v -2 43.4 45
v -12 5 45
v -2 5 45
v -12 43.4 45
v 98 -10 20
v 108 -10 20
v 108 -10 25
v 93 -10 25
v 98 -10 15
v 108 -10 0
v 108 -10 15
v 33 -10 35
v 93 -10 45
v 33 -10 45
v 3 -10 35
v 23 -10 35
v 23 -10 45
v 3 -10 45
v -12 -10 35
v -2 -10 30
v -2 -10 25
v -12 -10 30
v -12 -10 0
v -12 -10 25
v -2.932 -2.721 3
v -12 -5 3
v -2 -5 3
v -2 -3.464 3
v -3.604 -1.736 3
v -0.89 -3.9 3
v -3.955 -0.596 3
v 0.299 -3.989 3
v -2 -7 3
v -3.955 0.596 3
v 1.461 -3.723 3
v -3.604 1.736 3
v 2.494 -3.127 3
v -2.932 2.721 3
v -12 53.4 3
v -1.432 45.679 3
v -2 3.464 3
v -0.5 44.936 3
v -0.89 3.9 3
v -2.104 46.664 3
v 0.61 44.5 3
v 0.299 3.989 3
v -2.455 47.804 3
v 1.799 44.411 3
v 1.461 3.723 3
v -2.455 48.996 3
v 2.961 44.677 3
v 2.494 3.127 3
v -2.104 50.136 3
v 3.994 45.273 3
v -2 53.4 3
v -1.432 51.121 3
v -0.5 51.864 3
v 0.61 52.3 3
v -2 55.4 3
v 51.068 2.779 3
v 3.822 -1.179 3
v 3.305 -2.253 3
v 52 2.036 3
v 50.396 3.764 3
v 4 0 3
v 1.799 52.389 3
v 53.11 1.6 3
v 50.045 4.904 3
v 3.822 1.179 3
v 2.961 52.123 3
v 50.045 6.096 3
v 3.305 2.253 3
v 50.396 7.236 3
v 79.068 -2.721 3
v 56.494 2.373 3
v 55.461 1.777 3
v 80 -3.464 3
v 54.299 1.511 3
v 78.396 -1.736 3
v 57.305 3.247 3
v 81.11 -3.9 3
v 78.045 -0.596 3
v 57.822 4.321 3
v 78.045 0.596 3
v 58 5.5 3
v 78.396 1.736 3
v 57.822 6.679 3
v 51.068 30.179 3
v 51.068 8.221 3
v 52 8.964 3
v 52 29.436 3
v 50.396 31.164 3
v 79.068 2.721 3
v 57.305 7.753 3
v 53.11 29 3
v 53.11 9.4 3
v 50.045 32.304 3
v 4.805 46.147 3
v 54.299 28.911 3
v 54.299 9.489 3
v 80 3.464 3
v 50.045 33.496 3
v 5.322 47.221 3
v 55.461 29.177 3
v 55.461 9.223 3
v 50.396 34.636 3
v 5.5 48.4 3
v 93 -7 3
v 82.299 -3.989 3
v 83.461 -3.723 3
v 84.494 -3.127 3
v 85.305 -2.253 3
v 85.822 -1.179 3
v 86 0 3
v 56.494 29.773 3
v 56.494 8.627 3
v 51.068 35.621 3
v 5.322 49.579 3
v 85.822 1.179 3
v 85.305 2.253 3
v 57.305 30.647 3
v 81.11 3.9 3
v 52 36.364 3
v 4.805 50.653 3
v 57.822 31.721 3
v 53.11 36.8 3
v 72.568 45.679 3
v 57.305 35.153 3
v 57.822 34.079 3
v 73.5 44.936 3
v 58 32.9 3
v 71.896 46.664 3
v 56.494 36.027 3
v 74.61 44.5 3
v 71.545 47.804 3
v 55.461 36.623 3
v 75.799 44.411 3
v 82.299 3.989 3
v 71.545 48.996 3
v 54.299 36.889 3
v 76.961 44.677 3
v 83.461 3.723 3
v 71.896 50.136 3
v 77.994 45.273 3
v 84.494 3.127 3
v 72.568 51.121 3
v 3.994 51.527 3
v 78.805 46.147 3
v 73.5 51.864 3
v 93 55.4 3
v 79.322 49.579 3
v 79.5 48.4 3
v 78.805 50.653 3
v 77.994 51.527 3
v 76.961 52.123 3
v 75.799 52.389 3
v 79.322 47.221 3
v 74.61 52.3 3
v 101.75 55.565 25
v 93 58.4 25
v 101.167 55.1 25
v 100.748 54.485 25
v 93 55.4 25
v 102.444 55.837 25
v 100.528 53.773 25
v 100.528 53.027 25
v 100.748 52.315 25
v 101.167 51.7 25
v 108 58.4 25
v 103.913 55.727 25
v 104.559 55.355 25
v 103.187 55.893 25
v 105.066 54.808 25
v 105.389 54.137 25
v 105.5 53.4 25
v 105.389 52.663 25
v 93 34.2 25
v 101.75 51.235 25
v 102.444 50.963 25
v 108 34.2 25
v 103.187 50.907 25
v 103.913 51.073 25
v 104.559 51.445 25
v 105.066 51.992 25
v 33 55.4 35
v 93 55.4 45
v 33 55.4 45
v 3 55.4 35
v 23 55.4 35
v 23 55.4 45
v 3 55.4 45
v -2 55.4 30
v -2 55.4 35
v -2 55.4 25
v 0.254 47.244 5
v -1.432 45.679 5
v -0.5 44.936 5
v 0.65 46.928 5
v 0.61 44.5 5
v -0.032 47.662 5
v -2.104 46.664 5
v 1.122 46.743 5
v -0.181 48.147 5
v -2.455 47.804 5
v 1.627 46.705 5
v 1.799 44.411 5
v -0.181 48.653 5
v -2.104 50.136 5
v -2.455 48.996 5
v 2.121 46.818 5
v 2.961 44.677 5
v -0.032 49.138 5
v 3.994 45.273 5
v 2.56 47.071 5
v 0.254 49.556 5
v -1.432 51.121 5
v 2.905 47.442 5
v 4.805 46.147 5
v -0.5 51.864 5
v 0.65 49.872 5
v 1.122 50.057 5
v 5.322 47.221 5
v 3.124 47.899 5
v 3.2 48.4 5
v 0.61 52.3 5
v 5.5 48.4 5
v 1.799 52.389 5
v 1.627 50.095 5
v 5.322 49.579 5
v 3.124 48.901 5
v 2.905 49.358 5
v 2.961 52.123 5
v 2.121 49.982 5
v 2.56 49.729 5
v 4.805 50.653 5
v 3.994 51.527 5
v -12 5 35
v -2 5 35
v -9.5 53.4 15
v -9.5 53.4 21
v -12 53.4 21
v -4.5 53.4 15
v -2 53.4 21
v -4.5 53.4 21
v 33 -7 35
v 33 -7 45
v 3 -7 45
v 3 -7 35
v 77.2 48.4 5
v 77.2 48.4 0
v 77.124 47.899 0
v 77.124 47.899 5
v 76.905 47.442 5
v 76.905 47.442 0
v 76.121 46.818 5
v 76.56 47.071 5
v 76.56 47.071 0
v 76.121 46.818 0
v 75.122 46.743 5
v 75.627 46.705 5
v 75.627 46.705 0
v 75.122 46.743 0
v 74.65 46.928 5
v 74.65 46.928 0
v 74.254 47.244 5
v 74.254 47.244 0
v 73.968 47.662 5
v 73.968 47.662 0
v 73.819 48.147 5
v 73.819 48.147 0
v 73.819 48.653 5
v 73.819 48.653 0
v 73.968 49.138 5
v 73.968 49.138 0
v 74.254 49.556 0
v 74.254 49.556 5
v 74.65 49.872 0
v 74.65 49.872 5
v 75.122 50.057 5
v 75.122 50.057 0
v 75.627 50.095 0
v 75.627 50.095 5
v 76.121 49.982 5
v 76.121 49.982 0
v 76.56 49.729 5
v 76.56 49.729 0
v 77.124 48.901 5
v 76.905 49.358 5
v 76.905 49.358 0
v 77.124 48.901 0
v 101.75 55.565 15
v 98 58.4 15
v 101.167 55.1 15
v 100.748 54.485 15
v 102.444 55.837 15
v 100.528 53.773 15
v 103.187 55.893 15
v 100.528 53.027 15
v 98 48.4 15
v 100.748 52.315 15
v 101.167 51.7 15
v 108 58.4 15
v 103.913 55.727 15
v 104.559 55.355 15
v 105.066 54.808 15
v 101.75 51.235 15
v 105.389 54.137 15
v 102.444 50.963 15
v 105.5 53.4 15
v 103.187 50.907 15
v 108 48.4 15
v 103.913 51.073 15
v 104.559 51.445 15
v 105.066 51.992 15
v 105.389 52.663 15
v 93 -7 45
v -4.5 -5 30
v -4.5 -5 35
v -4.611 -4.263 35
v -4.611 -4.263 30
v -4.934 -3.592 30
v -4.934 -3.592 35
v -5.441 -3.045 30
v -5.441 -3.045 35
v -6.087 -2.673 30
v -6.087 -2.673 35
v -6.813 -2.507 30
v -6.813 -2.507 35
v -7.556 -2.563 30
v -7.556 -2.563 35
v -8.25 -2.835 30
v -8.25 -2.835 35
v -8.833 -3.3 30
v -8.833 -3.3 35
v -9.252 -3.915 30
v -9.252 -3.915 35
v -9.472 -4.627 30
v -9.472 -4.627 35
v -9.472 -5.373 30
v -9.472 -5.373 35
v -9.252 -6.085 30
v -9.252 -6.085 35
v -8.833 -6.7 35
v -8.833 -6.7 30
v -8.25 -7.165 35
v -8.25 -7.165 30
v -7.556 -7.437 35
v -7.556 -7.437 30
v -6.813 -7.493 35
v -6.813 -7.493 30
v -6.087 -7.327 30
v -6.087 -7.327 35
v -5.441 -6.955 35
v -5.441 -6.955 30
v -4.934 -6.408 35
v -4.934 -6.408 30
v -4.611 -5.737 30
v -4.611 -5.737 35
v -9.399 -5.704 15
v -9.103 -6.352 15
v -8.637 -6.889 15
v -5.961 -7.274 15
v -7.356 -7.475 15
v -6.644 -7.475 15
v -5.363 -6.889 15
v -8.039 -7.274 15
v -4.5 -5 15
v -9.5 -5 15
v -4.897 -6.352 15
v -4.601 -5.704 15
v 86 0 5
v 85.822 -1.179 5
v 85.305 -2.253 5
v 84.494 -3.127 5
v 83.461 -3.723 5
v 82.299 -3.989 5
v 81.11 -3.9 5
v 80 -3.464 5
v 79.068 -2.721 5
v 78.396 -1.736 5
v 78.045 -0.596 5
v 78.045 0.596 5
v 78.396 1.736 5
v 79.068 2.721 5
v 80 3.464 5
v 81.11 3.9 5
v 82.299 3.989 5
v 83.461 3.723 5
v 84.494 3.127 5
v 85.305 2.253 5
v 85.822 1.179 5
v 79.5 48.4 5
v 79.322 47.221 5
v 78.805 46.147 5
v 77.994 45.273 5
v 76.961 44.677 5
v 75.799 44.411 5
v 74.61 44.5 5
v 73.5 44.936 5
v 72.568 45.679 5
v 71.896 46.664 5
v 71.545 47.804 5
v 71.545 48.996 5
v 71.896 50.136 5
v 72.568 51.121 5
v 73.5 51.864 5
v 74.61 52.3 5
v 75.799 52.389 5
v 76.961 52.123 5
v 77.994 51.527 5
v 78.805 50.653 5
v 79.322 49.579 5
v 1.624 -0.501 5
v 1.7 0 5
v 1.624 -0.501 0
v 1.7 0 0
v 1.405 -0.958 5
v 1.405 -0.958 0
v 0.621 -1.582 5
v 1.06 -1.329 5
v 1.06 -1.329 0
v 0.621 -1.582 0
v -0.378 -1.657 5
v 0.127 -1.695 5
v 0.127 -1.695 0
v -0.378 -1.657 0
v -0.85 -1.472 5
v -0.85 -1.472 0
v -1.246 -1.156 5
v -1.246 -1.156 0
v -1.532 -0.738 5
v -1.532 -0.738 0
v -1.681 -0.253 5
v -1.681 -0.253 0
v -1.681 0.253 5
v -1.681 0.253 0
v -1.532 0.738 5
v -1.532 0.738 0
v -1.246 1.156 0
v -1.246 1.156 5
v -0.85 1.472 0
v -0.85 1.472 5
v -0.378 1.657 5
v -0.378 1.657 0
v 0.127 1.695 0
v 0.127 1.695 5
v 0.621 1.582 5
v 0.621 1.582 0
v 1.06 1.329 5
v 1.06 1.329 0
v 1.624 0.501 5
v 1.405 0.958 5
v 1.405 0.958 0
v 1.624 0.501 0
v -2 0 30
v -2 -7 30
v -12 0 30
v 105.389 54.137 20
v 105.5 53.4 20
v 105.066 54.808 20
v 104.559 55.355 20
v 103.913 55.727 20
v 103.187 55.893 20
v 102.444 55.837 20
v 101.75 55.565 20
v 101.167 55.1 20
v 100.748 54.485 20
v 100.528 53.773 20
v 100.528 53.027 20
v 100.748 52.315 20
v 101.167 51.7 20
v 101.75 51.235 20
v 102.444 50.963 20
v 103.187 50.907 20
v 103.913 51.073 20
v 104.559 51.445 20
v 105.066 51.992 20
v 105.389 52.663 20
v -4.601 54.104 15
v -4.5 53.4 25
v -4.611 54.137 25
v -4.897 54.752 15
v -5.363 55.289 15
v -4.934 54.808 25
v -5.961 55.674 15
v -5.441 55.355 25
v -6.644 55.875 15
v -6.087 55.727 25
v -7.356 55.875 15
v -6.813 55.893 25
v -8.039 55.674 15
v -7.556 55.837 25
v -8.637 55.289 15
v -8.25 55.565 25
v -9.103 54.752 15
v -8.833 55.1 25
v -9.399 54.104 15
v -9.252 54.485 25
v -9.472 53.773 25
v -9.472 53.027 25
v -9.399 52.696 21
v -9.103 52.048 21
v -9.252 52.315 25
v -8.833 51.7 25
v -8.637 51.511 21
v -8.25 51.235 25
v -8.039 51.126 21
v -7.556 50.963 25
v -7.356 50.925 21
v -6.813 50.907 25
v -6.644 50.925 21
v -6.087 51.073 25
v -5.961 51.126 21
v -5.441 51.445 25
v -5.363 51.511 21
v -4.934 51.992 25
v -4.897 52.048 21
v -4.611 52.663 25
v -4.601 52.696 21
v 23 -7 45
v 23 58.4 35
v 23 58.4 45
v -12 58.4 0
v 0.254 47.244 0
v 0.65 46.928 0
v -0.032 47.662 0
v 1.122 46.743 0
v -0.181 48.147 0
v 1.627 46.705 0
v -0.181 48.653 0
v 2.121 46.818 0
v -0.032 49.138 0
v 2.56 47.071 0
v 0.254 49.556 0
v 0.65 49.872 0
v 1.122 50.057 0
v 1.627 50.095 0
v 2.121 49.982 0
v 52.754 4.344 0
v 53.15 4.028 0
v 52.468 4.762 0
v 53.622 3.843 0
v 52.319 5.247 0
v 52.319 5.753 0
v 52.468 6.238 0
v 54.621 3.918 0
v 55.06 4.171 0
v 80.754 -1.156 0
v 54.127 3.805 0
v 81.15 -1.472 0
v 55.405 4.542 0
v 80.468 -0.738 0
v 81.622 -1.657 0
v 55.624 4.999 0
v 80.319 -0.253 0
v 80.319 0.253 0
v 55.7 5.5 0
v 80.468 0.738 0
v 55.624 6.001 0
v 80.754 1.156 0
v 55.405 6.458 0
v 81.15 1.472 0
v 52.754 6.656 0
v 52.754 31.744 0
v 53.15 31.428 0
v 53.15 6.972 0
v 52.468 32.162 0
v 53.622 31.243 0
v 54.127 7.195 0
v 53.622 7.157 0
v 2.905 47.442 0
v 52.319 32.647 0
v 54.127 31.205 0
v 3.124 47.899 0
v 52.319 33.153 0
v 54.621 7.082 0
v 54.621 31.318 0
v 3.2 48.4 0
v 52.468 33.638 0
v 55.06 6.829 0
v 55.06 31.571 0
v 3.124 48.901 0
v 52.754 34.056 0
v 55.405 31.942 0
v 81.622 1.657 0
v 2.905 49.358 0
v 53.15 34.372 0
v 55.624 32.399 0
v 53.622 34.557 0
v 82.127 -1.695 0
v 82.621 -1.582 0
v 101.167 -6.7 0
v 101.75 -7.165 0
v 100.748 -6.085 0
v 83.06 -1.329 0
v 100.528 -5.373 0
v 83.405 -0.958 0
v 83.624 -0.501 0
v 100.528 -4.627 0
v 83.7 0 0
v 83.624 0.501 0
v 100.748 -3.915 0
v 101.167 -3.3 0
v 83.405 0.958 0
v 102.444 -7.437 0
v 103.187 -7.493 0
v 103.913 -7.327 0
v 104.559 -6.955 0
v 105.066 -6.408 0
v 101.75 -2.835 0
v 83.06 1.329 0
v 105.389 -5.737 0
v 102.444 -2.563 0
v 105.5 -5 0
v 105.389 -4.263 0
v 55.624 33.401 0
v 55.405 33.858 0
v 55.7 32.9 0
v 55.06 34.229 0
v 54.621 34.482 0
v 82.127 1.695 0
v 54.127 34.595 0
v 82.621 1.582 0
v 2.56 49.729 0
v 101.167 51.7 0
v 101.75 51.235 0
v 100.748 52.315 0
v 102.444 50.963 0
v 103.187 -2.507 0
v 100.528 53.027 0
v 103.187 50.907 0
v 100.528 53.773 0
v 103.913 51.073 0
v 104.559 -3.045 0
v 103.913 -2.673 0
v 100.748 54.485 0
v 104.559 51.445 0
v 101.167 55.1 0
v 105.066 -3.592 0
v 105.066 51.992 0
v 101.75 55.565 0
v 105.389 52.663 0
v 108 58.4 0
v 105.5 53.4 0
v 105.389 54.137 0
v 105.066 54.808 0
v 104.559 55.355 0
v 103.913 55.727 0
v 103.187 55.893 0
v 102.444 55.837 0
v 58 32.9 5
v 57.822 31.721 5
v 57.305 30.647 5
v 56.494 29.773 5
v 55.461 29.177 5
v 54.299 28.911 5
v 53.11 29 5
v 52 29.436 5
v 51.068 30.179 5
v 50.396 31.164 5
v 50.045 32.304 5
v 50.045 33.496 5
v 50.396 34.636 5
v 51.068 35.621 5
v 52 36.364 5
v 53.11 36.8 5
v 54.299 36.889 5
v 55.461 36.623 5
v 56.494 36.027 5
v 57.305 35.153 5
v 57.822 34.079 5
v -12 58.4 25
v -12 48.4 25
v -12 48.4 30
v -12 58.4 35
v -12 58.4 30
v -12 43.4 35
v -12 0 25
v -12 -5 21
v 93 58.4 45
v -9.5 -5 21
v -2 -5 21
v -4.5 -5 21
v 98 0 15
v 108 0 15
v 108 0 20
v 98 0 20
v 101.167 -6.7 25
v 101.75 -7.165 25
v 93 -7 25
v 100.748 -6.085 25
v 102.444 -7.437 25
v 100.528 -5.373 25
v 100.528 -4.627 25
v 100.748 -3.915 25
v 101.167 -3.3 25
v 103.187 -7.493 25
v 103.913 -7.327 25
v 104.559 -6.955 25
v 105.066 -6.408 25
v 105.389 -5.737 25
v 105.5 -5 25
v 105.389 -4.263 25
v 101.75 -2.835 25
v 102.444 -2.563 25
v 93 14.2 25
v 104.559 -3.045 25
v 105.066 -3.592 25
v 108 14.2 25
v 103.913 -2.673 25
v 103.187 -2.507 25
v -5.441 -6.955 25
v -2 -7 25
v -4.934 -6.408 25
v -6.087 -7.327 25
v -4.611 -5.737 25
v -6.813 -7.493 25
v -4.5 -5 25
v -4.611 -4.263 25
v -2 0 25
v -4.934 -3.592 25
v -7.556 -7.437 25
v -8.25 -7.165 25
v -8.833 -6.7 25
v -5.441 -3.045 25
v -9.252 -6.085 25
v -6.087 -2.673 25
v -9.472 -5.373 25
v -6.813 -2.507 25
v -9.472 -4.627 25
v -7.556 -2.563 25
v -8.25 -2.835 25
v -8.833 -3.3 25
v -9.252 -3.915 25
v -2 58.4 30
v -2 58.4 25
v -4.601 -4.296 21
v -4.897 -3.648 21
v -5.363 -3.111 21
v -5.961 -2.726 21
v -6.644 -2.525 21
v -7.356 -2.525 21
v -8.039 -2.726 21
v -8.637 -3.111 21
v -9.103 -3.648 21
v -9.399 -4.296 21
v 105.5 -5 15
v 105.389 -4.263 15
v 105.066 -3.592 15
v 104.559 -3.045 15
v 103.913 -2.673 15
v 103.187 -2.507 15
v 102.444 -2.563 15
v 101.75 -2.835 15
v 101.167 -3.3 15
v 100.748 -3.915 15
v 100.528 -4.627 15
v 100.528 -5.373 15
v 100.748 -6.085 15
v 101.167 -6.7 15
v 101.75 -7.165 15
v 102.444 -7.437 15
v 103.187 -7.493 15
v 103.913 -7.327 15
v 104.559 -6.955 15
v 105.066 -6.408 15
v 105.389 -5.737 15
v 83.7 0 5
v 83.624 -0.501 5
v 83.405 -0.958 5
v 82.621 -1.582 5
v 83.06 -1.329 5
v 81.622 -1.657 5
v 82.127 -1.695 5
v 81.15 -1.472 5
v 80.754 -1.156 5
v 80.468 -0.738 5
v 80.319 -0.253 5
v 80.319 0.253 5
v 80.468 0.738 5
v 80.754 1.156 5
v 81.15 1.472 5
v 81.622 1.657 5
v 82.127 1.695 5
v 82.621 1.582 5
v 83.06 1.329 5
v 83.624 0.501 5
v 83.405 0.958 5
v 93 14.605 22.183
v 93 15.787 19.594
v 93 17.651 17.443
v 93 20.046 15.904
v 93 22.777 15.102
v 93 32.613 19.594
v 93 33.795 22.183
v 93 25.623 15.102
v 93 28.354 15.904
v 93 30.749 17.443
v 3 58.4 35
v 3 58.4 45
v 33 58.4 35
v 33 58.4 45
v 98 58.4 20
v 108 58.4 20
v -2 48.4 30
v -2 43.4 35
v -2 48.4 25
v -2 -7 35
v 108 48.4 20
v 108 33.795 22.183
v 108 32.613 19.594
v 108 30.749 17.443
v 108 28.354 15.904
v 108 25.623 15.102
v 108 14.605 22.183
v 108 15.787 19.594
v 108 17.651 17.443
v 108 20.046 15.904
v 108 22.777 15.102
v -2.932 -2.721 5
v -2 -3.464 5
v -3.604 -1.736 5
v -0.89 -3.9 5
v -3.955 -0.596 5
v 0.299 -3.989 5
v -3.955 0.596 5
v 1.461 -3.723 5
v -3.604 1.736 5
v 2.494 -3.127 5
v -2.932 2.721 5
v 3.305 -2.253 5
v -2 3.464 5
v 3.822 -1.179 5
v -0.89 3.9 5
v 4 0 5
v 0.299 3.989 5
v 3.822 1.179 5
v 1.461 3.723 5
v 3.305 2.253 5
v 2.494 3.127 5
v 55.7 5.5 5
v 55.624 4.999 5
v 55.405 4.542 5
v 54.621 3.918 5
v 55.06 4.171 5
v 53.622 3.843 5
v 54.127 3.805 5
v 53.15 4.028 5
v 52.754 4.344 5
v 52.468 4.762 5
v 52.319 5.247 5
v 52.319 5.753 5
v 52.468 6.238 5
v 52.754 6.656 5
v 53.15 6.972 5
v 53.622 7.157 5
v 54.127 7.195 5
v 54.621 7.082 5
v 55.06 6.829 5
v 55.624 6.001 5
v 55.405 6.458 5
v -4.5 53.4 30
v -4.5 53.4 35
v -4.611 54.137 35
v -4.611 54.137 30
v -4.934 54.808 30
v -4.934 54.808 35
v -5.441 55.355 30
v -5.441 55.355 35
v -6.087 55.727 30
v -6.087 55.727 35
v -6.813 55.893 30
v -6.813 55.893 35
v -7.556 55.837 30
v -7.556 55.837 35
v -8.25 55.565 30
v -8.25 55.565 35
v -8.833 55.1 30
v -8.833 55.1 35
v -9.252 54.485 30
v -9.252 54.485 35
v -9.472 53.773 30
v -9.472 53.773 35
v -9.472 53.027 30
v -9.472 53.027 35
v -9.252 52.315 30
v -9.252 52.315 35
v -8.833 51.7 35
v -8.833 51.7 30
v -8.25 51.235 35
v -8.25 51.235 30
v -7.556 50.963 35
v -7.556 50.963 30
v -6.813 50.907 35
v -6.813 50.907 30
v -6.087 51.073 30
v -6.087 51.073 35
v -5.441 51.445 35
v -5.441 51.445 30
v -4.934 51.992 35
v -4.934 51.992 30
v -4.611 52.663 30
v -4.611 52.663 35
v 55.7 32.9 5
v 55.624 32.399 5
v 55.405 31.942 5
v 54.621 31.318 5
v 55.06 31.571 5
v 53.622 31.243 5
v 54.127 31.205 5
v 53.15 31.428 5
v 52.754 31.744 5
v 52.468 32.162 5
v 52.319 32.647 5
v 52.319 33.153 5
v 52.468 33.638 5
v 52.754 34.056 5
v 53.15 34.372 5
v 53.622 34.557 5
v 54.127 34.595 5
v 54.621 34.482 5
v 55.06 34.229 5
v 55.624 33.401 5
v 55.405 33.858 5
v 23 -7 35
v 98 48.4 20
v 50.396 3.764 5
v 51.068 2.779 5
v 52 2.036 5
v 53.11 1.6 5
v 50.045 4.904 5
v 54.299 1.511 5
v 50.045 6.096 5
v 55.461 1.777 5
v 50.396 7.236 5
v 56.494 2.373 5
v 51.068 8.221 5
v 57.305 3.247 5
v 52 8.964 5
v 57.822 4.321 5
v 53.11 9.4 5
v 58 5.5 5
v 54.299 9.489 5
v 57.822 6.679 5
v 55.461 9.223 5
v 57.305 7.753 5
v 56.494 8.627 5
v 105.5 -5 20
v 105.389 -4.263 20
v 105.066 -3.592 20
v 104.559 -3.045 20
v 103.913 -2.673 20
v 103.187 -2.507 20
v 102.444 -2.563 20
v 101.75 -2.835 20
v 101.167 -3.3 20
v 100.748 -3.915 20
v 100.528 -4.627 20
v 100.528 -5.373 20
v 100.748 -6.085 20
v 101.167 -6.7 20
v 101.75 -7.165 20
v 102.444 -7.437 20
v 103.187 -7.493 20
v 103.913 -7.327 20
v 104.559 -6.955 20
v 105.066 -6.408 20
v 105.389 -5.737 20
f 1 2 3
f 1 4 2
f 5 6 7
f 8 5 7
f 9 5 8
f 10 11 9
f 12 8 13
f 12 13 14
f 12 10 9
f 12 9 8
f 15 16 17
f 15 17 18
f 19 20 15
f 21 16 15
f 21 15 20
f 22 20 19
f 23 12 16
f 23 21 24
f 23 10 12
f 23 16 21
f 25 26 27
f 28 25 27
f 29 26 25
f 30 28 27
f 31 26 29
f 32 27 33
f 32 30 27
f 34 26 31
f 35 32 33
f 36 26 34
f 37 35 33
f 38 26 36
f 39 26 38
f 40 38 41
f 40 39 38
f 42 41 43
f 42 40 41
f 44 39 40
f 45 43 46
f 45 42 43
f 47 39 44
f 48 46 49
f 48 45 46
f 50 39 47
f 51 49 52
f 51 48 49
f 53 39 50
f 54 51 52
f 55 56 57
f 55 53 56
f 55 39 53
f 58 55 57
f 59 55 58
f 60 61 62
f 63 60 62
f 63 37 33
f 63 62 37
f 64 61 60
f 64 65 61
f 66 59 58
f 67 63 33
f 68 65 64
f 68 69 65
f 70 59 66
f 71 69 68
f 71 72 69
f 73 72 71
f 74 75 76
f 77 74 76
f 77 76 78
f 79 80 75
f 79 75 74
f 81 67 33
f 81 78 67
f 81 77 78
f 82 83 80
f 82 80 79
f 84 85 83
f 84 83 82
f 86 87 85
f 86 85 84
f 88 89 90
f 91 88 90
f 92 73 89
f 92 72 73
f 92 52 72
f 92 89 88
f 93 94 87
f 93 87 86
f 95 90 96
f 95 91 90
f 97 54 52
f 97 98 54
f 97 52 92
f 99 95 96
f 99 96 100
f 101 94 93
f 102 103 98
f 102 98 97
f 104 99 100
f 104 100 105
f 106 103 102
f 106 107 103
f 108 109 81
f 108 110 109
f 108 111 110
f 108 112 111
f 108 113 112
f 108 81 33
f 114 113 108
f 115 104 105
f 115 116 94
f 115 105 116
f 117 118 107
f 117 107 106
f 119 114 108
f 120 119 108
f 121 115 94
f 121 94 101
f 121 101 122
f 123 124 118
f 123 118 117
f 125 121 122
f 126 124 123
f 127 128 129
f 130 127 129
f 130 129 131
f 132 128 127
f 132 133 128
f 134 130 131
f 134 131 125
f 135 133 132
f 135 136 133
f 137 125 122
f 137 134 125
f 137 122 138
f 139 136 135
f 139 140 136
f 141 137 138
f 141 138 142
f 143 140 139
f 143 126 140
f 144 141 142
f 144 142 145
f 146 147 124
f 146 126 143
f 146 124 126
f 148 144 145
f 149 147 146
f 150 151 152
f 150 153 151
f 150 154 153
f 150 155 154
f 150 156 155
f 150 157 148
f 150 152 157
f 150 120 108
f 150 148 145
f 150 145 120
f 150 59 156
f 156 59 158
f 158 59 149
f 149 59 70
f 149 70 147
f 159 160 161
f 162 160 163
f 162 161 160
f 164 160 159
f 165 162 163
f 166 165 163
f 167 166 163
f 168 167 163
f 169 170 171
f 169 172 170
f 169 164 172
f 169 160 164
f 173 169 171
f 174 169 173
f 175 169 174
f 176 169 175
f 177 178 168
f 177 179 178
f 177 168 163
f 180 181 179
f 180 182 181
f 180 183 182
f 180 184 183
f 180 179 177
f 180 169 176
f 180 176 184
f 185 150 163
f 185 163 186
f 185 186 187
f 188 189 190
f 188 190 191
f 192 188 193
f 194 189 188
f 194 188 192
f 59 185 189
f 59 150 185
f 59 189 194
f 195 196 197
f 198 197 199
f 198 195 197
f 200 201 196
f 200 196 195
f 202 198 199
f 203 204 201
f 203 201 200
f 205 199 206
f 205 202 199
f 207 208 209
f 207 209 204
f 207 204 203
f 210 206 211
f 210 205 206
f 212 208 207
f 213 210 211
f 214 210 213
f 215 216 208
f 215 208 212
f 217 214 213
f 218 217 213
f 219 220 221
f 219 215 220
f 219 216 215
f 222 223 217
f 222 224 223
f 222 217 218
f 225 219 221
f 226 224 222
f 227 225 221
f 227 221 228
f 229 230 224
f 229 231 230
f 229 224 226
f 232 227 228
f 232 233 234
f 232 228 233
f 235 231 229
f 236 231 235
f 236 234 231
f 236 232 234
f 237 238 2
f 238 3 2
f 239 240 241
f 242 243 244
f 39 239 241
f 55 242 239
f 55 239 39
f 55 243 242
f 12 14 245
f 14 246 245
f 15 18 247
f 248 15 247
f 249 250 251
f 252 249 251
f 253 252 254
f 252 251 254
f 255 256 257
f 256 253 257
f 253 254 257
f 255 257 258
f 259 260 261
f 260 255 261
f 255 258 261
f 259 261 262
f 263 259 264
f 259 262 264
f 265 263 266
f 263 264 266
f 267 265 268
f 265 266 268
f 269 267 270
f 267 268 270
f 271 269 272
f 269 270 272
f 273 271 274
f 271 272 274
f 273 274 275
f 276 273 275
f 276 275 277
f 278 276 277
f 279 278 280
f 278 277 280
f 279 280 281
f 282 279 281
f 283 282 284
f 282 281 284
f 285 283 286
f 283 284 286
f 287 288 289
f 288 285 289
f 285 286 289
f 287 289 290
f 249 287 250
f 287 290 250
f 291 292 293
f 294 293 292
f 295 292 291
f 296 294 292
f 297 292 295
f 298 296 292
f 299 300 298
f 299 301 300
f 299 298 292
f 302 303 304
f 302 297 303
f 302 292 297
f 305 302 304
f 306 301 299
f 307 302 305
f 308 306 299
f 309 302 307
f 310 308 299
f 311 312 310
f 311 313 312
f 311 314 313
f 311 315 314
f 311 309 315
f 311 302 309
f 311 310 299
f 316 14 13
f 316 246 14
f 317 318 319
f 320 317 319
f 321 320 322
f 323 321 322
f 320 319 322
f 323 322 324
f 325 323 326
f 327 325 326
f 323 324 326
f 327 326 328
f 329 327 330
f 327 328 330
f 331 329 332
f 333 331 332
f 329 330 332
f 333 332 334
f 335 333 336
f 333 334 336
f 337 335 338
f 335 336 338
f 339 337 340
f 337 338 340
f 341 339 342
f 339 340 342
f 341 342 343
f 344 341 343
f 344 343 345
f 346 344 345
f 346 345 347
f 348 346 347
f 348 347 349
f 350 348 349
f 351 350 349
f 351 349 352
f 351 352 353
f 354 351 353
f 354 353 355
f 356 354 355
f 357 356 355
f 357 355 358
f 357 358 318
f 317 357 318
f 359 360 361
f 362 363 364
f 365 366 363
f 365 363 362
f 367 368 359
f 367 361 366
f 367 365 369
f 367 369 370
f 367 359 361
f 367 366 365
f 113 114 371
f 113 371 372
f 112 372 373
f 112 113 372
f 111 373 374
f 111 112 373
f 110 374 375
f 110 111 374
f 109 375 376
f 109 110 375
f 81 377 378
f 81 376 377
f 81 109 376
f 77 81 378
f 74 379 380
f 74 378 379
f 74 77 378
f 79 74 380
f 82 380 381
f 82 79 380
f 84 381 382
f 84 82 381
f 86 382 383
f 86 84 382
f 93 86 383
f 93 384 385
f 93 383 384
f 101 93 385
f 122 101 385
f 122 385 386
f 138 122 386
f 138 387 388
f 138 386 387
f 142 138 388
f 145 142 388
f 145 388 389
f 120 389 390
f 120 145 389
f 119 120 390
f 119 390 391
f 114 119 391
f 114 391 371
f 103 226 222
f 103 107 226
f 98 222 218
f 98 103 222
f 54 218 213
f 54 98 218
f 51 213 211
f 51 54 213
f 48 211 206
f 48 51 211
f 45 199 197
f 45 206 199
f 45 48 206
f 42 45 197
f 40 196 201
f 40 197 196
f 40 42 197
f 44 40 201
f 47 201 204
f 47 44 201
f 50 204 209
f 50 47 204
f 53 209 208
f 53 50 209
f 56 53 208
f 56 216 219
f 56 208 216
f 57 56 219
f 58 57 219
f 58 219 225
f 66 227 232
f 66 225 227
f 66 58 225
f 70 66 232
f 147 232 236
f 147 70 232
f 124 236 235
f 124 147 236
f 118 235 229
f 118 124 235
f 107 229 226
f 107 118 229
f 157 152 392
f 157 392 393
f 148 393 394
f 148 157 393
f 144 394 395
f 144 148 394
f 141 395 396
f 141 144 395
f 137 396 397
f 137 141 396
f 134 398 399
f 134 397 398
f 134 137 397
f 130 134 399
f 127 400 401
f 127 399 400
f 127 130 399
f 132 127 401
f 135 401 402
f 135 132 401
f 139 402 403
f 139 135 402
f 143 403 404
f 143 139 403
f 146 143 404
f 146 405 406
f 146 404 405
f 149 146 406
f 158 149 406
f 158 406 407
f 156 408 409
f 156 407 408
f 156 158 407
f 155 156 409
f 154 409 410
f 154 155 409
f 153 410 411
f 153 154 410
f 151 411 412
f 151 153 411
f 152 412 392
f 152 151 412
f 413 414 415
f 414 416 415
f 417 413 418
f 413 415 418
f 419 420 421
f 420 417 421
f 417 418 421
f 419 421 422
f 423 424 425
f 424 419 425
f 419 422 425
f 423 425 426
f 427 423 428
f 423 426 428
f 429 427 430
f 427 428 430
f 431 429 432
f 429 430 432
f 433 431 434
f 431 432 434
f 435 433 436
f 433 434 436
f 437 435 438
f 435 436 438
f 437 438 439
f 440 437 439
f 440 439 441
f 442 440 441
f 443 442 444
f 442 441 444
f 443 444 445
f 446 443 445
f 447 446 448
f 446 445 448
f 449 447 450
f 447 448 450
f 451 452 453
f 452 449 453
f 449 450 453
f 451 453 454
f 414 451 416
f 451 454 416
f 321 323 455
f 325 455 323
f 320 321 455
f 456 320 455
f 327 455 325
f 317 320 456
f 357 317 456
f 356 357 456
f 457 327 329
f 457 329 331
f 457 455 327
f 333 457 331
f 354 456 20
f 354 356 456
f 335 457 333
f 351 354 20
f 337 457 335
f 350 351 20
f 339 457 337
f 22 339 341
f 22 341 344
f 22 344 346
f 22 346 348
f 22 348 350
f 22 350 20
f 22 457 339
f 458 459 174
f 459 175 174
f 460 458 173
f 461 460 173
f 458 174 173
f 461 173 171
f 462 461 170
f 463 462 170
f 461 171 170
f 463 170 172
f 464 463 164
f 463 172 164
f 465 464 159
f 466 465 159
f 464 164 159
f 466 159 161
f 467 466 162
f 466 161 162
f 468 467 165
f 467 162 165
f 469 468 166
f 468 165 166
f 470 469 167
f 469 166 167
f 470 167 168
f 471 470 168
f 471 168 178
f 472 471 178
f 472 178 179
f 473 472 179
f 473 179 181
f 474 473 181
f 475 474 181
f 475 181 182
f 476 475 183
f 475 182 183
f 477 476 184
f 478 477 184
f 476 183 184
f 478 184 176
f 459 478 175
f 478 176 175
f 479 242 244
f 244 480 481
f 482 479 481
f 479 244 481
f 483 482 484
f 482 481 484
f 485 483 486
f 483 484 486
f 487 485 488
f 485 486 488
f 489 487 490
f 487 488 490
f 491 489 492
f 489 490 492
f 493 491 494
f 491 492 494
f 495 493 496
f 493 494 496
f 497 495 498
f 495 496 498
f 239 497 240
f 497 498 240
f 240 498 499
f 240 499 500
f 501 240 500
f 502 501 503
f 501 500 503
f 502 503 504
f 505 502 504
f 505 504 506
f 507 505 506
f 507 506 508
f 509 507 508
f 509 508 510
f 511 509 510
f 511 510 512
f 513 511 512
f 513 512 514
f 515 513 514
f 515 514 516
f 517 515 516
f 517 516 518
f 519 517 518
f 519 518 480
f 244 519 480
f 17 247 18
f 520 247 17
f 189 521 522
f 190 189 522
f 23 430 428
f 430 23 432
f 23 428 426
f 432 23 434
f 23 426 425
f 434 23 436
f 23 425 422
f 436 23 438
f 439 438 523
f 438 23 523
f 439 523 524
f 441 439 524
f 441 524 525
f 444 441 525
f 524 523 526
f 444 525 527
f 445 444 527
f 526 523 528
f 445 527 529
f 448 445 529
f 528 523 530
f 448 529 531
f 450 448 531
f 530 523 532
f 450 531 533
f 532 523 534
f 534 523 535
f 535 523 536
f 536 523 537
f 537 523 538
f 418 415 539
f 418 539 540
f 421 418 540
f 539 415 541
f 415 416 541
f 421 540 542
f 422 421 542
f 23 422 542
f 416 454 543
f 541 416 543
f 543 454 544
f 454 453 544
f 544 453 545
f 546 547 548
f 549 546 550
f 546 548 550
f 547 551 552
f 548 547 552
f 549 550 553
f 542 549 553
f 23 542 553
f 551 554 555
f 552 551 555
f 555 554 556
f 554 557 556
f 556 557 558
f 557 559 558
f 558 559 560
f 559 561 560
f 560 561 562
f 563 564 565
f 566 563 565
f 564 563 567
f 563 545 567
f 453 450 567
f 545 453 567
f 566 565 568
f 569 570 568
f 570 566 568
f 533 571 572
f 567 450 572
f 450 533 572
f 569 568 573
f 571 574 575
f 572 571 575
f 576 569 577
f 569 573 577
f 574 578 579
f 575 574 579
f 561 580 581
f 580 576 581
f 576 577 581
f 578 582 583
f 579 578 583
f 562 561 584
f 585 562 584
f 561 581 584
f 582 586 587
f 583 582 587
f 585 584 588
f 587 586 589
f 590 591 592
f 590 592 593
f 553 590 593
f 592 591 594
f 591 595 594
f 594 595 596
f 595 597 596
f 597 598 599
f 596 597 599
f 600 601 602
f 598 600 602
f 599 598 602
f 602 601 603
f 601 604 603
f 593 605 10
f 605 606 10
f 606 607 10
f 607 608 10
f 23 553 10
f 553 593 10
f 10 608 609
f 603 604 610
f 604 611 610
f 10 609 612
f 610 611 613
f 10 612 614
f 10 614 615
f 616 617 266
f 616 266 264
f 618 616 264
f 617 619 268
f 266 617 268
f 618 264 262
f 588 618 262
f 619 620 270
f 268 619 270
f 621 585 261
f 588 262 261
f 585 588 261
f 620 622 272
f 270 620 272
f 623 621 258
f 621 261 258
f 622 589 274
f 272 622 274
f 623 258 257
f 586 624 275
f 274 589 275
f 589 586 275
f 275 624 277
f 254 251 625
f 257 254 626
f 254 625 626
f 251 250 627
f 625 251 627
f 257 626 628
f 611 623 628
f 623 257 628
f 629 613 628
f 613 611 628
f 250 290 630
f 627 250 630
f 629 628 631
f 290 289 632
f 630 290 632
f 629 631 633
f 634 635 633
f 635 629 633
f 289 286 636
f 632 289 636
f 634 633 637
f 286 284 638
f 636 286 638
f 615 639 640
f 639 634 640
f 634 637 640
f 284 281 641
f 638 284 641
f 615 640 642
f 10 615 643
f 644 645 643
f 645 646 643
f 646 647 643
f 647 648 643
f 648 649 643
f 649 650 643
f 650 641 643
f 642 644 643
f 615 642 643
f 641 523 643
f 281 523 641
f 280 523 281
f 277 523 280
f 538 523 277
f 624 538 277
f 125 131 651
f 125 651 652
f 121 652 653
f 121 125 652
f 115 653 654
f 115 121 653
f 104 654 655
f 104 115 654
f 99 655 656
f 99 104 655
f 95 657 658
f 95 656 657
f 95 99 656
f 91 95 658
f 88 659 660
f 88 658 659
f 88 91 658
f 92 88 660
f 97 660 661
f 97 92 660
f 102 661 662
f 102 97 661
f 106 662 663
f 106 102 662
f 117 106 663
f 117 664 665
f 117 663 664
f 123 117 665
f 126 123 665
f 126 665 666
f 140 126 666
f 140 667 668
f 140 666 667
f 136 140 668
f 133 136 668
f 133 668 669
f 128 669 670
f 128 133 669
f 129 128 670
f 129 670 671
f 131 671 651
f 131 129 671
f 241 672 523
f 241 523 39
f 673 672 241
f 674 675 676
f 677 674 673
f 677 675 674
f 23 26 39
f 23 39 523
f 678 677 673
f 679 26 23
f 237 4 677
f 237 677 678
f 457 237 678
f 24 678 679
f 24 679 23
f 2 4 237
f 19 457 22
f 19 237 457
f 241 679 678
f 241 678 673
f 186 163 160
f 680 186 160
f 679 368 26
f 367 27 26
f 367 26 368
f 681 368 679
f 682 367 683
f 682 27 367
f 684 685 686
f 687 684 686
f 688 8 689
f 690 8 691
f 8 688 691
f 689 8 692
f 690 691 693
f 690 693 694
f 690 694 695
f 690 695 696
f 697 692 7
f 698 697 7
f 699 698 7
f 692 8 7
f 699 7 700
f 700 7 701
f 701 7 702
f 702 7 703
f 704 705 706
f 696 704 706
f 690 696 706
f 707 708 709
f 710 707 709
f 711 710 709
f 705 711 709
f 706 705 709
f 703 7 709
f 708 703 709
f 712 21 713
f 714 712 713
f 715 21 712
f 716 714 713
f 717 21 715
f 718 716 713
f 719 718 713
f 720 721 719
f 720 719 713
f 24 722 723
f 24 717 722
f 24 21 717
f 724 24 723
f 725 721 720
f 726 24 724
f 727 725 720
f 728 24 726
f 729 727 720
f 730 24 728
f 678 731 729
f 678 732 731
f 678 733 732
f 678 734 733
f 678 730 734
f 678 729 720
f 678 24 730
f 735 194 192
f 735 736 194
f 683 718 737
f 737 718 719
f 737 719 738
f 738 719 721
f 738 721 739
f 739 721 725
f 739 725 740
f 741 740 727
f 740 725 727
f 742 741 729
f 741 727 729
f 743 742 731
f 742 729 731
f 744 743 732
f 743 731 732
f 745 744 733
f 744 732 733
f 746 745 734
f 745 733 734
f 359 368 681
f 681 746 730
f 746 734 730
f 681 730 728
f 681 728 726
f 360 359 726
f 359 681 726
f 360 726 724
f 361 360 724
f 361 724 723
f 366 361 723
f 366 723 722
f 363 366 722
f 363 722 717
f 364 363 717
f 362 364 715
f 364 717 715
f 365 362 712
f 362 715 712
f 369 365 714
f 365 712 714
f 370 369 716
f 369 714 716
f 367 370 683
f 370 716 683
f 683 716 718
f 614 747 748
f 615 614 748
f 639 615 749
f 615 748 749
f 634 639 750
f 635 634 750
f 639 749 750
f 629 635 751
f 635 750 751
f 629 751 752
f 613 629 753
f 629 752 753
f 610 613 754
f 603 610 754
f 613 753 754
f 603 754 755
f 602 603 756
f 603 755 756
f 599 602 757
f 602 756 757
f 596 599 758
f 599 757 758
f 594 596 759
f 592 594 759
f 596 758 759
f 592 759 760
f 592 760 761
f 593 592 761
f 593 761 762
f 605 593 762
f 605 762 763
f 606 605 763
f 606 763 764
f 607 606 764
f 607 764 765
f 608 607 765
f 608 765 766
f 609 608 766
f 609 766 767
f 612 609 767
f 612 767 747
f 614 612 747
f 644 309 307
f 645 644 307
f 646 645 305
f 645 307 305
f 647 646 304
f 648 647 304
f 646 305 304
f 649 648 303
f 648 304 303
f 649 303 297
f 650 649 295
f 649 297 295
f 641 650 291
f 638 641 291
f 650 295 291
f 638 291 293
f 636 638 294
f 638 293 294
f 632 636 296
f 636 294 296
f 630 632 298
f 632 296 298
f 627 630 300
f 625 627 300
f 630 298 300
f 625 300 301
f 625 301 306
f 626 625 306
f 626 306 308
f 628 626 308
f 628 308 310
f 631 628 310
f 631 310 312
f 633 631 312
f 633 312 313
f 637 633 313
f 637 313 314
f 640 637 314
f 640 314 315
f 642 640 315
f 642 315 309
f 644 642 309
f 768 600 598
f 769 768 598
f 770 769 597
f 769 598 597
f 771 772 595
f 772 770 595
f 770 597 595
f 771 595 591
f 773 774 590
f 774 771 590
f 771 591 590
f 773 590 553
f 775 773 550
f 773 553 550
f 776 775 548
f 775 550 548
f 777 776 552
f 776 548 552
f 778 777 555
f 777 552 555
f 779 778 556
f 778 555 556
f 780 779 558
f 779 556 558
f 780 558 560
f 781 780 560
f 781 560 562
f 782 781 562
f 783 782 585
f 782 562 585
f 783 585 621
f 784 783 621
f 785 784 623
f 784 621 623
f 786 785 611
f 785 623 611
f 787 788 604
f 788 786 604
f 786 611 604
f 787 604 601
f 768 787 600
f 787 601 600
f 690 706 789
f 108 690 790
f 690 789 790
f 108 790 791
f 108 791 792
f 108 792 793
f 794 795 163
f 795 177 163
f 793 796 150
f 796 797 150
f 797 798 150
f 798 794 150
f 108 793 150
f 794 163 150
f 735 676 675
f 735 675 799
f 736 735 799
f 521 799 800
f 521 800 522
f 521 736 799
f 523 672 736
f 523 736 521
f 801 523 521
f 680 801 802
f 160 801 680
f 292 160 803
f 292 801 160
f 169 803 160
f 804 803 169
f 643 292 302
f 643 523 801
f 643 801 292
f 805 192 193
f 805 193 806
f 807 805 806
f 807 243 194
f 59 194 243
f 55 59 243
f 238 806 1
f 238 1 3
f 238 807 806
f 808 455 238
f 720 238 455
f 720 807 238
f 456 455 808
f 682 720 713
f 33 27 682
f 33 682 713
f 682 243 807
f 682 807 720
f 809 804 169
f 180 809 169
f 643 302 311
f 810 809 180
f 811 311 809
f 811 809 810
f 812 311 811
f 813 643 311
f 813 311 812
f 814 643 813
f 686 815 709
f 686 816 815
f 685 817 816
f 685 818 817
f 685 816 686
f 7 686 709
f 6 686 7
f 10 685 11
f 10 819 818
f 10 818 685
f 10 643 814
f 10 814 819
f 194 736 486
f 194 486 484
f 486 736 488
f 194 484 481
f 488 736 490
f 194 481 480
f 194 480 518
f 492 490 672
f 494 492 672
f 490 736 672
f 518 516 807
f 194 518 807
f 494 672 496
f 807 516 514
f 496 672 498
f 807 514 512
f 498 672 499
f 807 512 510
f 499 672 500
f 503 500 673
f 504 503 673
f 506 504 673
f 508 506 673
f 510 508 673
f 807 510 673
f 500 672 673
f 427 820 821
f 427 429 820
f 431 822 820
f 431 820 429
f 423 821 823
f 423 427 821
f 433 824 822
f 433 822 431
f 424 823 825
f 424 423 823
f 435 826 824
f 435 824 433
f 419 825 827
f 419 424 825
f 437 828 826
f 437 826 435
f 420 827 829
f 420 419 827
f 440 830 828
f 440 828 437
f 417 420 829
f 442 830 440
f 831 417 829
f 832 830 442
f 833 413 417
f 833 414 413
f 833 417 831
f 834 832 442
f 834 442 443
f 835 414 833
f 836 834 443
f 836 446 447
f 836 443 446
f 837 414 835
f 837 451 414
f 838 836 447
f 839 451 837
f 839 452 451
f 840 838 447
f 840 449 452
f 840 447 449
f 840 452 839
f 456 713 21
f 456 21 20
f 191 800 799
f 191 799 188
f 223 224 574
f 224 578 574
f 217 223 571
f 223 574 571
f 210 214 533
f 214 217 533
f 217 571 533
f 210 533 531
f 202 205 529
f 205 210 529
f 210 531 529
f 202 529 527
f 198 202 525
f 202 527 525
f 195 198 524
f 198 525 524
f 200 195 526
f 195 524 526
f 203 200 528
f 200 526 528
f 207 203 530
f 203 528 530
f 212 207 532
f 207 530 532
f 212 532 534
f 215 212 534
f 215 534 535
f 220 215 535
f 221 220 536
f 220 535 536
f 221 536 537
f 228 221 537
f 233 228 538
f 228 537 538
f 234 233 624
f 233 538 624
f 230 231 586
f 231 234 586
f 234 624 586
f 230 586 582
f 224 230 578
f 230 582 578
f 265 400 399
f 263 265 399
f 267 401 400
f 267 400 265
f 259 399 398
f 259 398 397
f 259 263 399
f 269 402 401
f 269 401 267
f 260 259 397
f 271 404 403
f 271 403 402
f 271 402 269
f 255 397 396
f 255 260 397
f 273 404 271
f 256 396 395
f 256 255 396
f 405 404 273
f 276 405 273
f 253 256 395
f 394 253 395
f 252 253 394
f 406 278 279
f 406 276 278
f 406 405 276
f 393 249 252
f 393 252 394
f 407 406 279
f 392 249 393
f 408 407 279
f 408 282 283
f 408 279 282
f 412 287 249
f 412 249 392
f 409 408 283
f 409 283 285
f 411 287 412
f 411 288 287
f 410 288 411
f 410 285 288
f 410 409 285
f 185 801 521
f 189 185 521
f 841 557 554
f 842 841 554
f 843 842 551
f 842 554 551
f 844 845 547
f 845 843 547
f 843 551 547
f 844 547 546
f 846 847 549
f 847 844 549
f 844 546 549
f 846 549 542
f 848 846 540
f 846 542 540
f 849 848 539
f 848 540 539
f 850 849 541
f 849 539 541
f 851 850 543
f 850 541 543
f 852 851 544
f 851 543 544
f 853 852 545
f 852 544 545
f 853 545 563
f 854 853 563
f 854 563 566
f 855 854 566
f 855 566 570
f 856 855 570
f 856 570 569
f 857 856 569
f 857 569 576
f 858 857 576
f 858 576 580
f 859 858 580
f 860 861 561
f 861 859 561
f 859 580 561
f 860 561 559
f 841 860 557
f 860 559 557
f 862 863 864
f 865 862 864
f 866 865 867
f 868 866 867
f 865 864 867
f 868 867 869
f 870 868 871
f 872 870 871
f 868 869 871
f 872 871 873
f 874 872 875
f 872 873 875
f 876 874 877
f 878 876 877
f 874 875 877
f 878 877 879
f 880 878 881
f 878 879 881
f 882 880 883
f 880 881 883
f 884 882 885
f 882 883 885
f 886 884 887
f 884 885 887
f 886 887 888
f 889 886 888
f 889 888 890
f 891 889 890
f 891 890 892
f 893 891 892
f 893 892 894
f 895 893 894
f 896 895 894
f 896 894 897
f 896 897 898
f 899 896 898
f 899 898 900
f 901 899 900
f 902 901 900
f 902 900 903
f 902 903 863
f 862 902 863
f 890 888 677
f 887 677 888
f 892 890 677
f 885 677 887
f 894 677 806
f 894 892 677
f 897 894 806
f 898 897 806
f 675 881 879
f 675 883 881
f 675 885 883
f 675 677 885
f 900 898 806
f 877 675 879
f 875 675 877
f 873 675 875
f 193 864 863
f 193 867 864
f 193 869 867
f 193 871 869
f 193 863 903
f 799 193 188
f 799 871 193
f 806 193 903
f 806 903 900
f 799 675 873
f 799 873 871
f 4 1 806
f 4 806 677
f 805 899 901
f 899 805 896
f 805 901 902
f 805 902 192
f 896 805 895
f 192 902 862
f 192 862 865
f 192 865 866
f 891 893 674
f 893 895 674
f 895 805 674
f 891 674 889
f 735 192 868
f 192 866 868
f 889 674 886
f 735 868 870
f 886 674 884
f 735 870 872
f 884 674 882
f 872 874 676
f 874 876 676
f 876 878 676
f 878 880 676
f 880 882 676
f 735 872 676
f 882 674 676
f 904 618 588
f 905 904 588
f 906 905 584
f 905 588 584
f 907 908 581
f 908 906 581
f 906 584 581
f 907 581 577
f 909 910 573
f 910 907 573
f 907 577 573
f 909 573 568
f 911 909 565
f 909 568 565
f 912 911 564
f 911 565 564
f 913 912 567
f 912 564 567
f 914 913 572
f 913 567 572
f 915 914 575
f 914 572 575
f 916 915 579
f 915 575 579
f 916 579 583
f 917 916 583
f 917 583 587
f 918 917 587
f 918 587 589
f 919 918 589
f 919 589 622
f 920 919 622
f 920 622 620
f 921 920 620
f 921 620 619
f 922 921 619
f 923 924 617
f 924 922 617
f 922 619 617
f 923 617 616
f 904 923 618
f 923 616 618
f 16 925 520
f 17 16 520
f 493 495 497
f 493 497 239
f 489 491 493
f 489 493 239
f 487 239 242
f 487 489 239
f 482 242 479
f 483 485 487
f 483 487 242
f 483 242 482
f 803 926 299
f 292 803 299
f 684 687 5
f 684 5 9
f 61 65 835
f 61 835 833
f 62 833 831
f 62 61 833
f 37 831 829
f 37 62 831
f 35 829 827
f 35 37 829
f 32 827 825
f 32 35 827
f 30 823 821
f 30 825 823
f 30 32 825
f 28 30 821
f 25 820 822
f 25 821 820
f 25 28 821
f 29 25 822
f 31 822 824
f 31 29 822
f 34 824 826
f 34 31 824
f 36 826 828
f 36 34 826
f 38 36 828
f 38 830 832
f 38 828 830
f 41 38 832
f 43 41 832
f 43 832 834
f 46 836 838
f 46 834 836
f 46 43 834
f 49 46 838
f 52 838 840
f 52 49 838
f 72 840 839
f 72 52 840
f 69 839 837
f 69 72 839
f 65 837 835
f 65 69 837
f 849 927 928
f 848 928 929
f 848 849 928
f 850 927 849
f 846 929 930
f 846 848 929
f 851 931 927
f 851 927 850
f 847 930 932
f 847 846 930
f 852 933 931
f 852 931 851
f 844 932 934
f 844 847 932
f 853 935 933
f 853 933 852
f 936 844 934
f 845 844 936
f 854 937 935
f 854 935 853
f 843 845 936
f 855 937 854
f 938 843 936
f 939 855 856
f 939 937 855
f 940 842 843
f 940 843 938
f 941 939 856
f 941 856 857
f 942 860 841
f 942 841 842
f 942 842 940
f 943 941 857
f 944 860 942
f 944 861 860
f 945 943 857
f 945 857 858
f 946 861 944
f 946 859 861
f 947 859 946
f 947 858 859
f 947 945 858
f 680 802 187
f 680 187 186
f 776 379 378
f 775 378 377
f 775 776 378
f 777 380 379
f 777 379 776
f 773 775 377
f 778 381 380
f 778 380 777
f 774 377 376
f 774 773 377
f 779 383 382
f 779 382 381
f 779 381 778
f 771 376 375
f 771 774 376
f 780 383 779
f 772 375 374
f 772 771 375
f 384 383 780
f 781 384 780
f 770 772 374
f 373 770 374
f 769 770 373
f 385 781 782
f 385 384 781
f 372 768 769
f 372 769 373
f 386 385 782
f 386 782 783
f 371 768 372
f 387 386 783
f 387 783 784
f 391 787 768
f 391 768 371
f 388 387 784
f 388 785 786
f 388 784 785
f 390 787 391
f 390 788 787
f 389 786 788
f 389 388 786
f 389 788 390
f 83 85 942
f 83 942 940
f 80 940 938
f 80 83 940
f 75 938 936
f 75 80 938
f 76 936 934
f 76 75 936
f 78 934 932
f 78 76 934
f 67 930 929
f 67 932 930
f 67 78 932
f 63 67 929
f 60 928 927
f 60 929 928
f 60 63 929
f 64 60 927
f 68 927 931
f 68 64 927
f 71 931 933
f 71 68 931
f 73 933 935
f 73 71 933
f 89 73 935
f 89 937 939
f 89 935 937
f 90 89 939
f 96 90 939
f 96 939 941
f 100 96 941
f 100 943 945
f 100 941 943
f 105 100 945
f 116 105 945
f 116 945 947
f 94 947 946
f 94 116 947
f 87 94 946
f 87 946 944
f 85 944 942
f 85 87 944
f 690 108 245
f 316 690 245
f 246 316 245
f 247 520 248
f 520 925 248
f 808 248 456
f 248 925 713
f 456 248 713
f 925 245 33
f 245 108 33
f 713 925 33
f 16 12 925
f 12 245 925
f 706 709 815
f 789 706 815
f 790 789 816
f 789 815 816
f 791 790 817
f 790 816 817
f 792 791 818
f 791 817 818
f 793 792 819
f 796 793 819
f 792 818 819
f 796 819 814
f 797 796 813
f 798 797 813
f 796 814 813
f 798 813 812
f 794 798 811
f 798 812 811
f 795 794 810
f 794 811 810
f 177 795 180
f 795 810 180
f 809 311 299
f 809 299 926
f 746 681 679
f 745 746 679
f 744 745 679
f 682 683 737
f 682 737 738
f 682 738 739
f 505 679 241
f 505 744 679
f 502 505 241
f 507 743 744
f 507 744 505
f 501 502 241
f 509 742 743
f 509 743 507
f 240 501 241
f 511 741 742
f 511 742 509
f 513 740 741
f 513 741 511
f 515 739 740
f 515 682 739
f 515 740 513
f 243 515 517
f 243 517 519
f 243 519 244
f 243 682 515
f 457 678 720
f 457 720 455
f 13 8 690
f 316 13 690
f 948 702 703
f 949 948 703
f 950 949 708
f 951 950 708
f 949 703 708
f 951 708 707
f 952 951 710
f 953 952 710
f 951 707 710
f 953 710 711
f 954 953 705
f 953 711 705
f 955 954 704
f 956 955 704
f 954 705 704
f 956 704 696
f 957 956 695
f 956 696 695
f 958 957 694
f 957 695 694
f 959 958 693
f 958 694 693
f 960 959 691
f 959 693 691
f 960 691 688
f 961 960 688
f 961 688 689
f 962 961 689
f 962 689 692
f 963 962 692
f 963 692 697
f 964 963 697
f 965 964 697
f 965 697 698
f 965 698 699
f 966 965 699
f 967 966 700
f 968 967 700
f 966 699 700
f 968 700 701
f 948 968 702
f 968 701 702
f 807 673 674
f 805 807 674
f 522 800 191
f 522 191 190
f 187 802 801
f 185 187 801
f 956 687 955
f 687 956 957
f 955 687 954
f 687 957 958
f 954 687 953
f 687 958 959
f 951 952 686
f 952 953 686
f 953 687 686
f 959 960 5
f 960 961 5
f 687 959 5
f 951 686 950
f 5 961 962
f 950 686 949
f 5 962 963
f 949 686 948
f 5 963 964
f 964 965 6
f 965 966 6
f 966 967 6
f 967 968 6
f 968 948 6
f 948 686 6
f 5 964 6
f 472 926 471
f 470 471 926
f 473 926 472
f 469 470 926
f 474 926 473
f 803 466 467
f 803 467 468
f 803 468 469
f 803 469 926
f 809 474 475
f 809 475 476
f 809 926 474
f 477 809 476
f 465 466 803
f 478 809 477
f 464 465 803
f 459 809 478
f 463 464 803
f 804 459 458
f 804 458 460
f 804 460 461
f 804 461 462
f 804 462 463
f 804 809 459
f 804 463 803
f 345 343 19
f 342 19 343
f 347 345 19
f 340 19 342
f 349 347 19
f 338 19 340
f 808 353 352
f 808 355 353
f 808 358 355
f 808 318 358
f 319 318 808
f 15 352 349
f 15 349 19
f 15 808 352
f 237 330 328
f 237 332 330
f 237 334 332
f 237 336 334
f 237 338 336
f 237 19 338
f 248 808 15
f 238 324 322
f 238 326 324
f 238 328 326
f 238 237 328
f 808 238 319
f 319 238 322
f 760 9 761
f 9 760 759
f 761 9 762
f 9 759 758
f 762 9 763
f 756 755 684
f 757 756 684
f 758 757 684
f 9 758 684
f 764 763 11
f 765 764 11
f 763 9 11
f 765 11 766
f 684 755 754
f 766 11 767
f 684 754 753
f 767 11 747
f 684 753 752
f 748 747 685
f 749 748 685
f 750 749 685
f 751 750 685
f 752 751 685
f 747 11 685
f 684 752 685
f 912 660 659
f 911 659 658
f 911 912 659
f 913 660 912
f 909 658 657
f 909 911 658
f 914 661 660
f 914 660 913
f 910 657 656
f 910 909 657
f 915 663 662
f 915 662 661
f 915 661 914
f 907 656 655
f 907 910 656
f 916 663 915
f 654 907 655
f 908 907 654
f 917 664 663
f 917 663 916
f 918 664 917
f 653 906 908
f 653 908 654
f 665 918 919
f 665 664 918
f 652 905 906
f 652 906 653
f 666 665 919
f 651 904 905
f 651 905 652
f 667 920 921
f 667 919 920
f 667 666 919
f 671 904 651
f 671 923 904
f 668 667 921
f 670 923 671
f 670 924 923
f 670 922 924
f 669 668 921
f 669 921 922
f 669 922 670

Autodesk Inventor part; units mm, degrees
ref_plane "YZ Plane" through (0, 0, 0) normal (1, 0, 0) x (0, 1, 0)
ref_plane "XZ Plane" through (0, 0, 0) normal (0, 1, 0) x (-1, 0, 0)
ref_plane "XY Plane" through (0, 0, 0) normal (0, 0, 1) x (1, 0, 0)
sketch "Sketch1" plane through (0, 0, 0) normal (0, 0, 1) x (1, 0, 0)
  line L0 (-27, 58.4) -> (108, 58.4)
  line L1 (108, 58.4) -> (108, -10)
  line L2 (108, -10) -> (-27, -10)
  line L3 (-27, -10) -> (-27, 58.4)
  circle A0 centre (82, 0) radius 1.7
  circle A1 centre (54, 5.5) radius 1.7
  circle A2 centre (54, 32.9) radius 1.7
  circle A3 centre (75.5, 48.4) radius 1.7
  circle A4 centre (1.5, 48.4) radius 1.7
  circle A5 centre (0, 0) radius 1.7
  dimension "d63" = 82
  dimension "d64" = 48.4
  dimension "d65" = 1.5
  dimension "d66" = 15.5
  dimension "d67" = 27.4
  dimension "d68" = 48.4
  dimension "d69" = 6.5
  dimension "d70" = 74
  dimension "d71" = 5.5
  dimension "d72" = 28
  dimension "d75" = 135
  dimension "d76" = 68.4
  dimension "d77" = 10
  dimension "d78" = 27
  dimension "d79" = 3.4
  dimension "d80" = 3.4
  dimension "d81" = 3.4
  dimension "d82" = 3.4
  dimension "d83" = 3.4
  dimension "d84" = 3.4
extrude "Extrusion1" add sketch "Sketch1" along normal blind 3
sketch "Sketch2" plane through (108, -10, 0) normal (1, 0, 0) x (0, 0, -1)
  circle A0 centre (-25, 34.2) radius 10 construction
  line L0 (-3, 0) -> (-3, 68.4) projected
  line L1 (0, 0) -> (-3, 0) projected
  line L2 (-3, 0) -> (-25, 0)
  line L3 (-25, 0) -> (-25, 68.4) construction
  line L4 (-25, 68.4) -> (-3, 68.4)
  line L5 (-25, 68.4) -> (-25, 44.2)
  line L6 (-25, 0) -> (-25, 24.2)
  arc A1 (-25, 24.2) -> (-25, 44.2) centre (-25, 34.2) ccw
  point P0 (0, 10)
  point P1 (-3, 34.2)
  point P2 (-3, 34.2)
  dimension "d23" = 20
  dimension "d24" = 22
extrude "Extrusion2" add sketch "Sketch2" against normal blind 15
sketch "Sketch3" plane through (108, -10, 25) normal (0, 0, 1) x (1, 0, 0)
  circle A0 centre (-5, 5) radius 2.5
  line L0 (0, 0) -> (-15, 0) projected
  line L1 (0, 24.2) -> (0, 0) projected
  point P0 (-108, 10)
  dimension "d28" = 5
  dimension "d29" = 5
  dimension "d30" = 5
extrude "Extrusion3" cut sketch "Sketch3" against normal through all
sketch "Sketch4" plane through (0, 0, 3) normal (0, 0, 1) x (1, 0, 0)
  line L0 (-27, 58.4) -> (108, 58.4) projected
  line L1 (-27, 58.4) -> (-2, 58.4)
  line L2 (-2, 58.4) -> (-2, -10)
  line L3 (-2, -10) -> (-27, -10)
  line L4 (-27, -10) -> (-27, 58.4)
  point P0 (0, 0)
  point P1 (93, -10)
  dimension "d33" = 25
extrude "Extrusion4" add sketch "Sketch4" along normal blind 42
sketch "Sketch5" plane through (-2, -10, 3) normal (1, 0, 0) x (0, 0, -1)
  line L0 (0, 68.4) -> (0, 0) projected
  line L1 (0, 0) -> (0, 68.4) projected
  line L2 (0, 5) -> (-18, 5)
  line L3 (-18, 5) -> (-18, 63.4)
  line L4 (-18, 63.4) -> (0, 63.4)
  line L5 (0, 63.4) -> (0, 5)
  line L6 (3, 68.4) -> (-42, 68.4) projected
  point P0 (3, 10)
  point P1 (0, 8.3)
  point P2 (0, 11.7)
  point P3 (0, 23.8)
  point P4 (0, 27.2)
  point P5 (0, 51.2)
  point P6 (0, 54.6)
  point P7 (0, 56.7)
  point P8 (0, 60.1)
  point P9 (0, 56.7)
  point P10 (0, 60.1)
  point P11 (0, 8.3)
  point P12 (0, 11.7)
  dimension "d36" = 5
  dimension "d37" = 5
  dimension "d38" = 18
extrude "Extrusion5" cut sketch "Sketch5" against normal through all
sketch "Sketch6" plane through (0, 0, 3) normal (0, 0, 1) x (1, 0, 0)
  line L0 (-2, -10) -> (93, -10) projected
  line L1 (93, -10) -> (93, 58.4) projected
  line L2 (-2, -10) -> (93, -10)
  line L3 (93, -10) -> (93, -7)
  line L4 (93, -7) -> (-2, -7)
  line L5 (-2, -7) -> (-2, -10)
  line L6 (93, 58.4) -> (-2, 58.4) projected
  line L7 (-2, 58.4) -> (93, 58.4)
  line L8 (93, 58.4) -> (93, 55.4)
  line L9 (93, 55.4) -> (-2, 55.4)
  line L10 (-2, 55.4) -> (-2, 58.4)
  point P0 (0, 0)
  dimension "d41" = 3
  dimension "d42" = 3
extrude "Extrusion6" add sketch "Sketch6" along normal blind 42
sketch "Sketch7" plane through (108, 34.2, 25) normal (0, 0, 1) x (1, 0, 0)
  circle A0 centre (-5, 19.2) radius 2.5
  line L0 (0, 24.2) -> (-15, 24.2) projected
  point P0 (-108, -34.2)
  dimension "d45" = 5
  dimension "d46" = 5
  dimension "d47" = 5
extrude "Extrusion7" cut sketch "Sketch7" against normal through all
sketch "Sketch9" plane through (-2, 55.4, 3) normal (0, -1, 0) x (1, 0, 0)
  line L0 (0, 42) -> (95, 42) projected
  line L1 (25, 42) -> (35, 42)
  line L2 (35, 42) -> (35, 32)
  line L3 (35, 32) -> (25, 32)
  line L4 (25, 32) -> (25, 42)
  point P0 (2, -3)
  dimension "d50" = 25
  dimension "d51" = 10
  dimension "d52" = 10
extrude "Extrusion8" cut sketch "Sketch9" along normal through all both and the other way through all
sketch "Sketch10" plane through (108, -10, 0) normal (1, 0, 0) x (0, 0, -1)
  line L0 (0, 7.5) -> (0, 2.5) projected
  line L1 (-25, 2.5) -> (-25, 7.5) projected
  line L2 (0, 65.9) -> (0, 60.9) projected
  line L3 (-25, 60.9) -> (-25, 65.9) projected
  line L4 (0, 0) -> (-45, 0) projected
  line L5 (-20, 0) -> (-15, 0)
  line L6 (-15, 0) -> (-15, 10)
  line L7 (-15, 10) -> (-20, 10)
  line L8 (-20, 10) -> (-20, 0)
  line L9 (0, 68.4) -> (-45, 68.4) projected
  line L10 (-20, 68.4) -> (-15, 68.4)
  line L11 (-15, 68.4) -> (-15, 58.4)
  line L12 (-15, 58.4) -> (-20, 58.4)
  line L13 (-20, 58.4) -> (-20, 68.4)
  point P0 (0, 10)
  dimension "d55" = 5
  dimension "d56" = 10
  dimension "d57" = 5
  dimension "d58" = 10
extrude "Extrusion9" cut sketch "Sketch10" against normal blind 10
sketch "Sketch12" plane through (0, 0, 45) normal (0, 0, 1) x (1, 0, 0)
  line L0 (23, 58.4) -> (-27, 58.4) projected
  line L1 (-27, -10) -> (23, -10) projected
  line L2 (-27, 58.4) -> (-12, 58.4)
  line L3 (-12, 58.4) -> (-12, -10)
  line L4 (-12, -10) -> (-27, -10)
  line L5 (-27, -10) -> (-27, 58.4)
  line L6 (-2, -7) -> (-2, 55.4) projected
  point P0 (0, 0)
  dimension "d85" = 10
extrude "Extrusion10" cut sketch "Sketch12" against normal through all
sketch "Sketch13" plane through (0, 0, 45) normal (0, 0, 1) x (1, 0, 0)
  line L0 (-12, -10) -> (-12, 58.4) projected
  line L1 (-12, 58.4) -> (3, 58.4)
  line L2 (3, 58.4) -> (3, 43.4)
  line L3 (3, 43.4) -> (-12, 43.4)
  line L4 (-12, 43.4) -> (-12, 58.4)
  line L5 (-12, -10) -> (3, -10)
  line L6 (3, -10) -> (3, 5)
  line L7 (3, 5) -> (-12, 5)
  line L8 (-12, 5) -> (-12, -10)
  point P0 (0, 0)
  dimension "d88" = 15
  dimension "d89" = 15
  dimension "d90" = 15
  dimension "d91" = 15
extrude "Extrusion11" cut sketch "Sketch13" against normal blind 10
sketch "Sketch14" plane through (0, 0, 35) normal (0, 0, 1) x (1, 0, 0)
  circle A0 centre (-7, 53.4) radius 2.5
  circle A1 centre (-7, -5) radius 2.5
  line L0 (3, -10) -> (-12, -10) projected
  line L1 (-12, 58.4) -> (3, 58.4) projected
  line L2 (-12, 43.4) -> (-12, 58.4) projected
  point P0 (0, 0)
  dimension "d94" = 5
  dimension "d95" = 5
  dimension "d96" = 5
  dimension "d97" = 5
  dimension "d98" = 5
extrude "Extrusion12" cut sketch "Sketch14" against normal blind 20
sketch "Sketch15" plane through (-12, -10, 0) normal (-1, 0, 0) x (0, 0, 1)
  line L0 (30, 68.4) -> (25, 68.4)
  line L1 (25, 68.4) -> (25, 58.4)
  line L2 (25, 58.4) -> (30, 58.4)
  line L3 (30, 58.4) -> (30, 68.4)
  line L4 (25, 0) -> (45, 0) projected
  line L5 (30, 0) -> (25, 0)
  line L6 (25, 0) -> (25, 10)
  line L7 (25, 10) -> (30, 10)
  line L8 (30, 10) -> (30, 0)
  line L9 (0, 68.4) -> (35, 68.4) projected
  line L10 (35, 0) -> (35, 15) projected
  point P0 (0, 10)
  dimension "d101" = 5
  dimension "d102" = 10
  dimension "d103" = 10
  dimension "d104" = 5
extrude "Extrusion13" cut sketch "Sketch15" against normal blind 10
sketch "Sketch16" plane through (0, 0, 3) normal (0, 0, 1) x (1, 0, 0)
  circle A0 centre (0, 0) radius 1.7 projected
  circle A1 centre (1.5, 48.4) radius 1.7 projected
  circle A2 centre (54, 32.9) radius 1.7 projected
  circle A3 centre (75.5, 48.4) radius 1.7 projected
  circle A4 centre (54, 5.5) radius 1.7 projected
  circle A5 centre (82, 0) radius 1.7 projected
  circle A6 centre (75.5, 48.4) radius 4
  circle A7 centre (54, 32.9) radius 4
  circle A8 centre (54, 5.5) radius 4
  circle A9 centre (82, 0) radius 4
  circle A10 centre (0, 0) radius 1.7 projected
  circle A11 centre (0, 0) radius 4
  circle A12 centre (1.5, 48.4) radius 4
  dimension "d107" = 8
  dimension "d108" = 8
  dimension "d109" = 8
  dimension "d110" = 8
  dimension "d111" = 8
  dimension "d112" = 8
extrude "Extrusion14" add sketch "Sketch16" along normal blind 2
properties part number "BP007" material "ABS Plastic"
